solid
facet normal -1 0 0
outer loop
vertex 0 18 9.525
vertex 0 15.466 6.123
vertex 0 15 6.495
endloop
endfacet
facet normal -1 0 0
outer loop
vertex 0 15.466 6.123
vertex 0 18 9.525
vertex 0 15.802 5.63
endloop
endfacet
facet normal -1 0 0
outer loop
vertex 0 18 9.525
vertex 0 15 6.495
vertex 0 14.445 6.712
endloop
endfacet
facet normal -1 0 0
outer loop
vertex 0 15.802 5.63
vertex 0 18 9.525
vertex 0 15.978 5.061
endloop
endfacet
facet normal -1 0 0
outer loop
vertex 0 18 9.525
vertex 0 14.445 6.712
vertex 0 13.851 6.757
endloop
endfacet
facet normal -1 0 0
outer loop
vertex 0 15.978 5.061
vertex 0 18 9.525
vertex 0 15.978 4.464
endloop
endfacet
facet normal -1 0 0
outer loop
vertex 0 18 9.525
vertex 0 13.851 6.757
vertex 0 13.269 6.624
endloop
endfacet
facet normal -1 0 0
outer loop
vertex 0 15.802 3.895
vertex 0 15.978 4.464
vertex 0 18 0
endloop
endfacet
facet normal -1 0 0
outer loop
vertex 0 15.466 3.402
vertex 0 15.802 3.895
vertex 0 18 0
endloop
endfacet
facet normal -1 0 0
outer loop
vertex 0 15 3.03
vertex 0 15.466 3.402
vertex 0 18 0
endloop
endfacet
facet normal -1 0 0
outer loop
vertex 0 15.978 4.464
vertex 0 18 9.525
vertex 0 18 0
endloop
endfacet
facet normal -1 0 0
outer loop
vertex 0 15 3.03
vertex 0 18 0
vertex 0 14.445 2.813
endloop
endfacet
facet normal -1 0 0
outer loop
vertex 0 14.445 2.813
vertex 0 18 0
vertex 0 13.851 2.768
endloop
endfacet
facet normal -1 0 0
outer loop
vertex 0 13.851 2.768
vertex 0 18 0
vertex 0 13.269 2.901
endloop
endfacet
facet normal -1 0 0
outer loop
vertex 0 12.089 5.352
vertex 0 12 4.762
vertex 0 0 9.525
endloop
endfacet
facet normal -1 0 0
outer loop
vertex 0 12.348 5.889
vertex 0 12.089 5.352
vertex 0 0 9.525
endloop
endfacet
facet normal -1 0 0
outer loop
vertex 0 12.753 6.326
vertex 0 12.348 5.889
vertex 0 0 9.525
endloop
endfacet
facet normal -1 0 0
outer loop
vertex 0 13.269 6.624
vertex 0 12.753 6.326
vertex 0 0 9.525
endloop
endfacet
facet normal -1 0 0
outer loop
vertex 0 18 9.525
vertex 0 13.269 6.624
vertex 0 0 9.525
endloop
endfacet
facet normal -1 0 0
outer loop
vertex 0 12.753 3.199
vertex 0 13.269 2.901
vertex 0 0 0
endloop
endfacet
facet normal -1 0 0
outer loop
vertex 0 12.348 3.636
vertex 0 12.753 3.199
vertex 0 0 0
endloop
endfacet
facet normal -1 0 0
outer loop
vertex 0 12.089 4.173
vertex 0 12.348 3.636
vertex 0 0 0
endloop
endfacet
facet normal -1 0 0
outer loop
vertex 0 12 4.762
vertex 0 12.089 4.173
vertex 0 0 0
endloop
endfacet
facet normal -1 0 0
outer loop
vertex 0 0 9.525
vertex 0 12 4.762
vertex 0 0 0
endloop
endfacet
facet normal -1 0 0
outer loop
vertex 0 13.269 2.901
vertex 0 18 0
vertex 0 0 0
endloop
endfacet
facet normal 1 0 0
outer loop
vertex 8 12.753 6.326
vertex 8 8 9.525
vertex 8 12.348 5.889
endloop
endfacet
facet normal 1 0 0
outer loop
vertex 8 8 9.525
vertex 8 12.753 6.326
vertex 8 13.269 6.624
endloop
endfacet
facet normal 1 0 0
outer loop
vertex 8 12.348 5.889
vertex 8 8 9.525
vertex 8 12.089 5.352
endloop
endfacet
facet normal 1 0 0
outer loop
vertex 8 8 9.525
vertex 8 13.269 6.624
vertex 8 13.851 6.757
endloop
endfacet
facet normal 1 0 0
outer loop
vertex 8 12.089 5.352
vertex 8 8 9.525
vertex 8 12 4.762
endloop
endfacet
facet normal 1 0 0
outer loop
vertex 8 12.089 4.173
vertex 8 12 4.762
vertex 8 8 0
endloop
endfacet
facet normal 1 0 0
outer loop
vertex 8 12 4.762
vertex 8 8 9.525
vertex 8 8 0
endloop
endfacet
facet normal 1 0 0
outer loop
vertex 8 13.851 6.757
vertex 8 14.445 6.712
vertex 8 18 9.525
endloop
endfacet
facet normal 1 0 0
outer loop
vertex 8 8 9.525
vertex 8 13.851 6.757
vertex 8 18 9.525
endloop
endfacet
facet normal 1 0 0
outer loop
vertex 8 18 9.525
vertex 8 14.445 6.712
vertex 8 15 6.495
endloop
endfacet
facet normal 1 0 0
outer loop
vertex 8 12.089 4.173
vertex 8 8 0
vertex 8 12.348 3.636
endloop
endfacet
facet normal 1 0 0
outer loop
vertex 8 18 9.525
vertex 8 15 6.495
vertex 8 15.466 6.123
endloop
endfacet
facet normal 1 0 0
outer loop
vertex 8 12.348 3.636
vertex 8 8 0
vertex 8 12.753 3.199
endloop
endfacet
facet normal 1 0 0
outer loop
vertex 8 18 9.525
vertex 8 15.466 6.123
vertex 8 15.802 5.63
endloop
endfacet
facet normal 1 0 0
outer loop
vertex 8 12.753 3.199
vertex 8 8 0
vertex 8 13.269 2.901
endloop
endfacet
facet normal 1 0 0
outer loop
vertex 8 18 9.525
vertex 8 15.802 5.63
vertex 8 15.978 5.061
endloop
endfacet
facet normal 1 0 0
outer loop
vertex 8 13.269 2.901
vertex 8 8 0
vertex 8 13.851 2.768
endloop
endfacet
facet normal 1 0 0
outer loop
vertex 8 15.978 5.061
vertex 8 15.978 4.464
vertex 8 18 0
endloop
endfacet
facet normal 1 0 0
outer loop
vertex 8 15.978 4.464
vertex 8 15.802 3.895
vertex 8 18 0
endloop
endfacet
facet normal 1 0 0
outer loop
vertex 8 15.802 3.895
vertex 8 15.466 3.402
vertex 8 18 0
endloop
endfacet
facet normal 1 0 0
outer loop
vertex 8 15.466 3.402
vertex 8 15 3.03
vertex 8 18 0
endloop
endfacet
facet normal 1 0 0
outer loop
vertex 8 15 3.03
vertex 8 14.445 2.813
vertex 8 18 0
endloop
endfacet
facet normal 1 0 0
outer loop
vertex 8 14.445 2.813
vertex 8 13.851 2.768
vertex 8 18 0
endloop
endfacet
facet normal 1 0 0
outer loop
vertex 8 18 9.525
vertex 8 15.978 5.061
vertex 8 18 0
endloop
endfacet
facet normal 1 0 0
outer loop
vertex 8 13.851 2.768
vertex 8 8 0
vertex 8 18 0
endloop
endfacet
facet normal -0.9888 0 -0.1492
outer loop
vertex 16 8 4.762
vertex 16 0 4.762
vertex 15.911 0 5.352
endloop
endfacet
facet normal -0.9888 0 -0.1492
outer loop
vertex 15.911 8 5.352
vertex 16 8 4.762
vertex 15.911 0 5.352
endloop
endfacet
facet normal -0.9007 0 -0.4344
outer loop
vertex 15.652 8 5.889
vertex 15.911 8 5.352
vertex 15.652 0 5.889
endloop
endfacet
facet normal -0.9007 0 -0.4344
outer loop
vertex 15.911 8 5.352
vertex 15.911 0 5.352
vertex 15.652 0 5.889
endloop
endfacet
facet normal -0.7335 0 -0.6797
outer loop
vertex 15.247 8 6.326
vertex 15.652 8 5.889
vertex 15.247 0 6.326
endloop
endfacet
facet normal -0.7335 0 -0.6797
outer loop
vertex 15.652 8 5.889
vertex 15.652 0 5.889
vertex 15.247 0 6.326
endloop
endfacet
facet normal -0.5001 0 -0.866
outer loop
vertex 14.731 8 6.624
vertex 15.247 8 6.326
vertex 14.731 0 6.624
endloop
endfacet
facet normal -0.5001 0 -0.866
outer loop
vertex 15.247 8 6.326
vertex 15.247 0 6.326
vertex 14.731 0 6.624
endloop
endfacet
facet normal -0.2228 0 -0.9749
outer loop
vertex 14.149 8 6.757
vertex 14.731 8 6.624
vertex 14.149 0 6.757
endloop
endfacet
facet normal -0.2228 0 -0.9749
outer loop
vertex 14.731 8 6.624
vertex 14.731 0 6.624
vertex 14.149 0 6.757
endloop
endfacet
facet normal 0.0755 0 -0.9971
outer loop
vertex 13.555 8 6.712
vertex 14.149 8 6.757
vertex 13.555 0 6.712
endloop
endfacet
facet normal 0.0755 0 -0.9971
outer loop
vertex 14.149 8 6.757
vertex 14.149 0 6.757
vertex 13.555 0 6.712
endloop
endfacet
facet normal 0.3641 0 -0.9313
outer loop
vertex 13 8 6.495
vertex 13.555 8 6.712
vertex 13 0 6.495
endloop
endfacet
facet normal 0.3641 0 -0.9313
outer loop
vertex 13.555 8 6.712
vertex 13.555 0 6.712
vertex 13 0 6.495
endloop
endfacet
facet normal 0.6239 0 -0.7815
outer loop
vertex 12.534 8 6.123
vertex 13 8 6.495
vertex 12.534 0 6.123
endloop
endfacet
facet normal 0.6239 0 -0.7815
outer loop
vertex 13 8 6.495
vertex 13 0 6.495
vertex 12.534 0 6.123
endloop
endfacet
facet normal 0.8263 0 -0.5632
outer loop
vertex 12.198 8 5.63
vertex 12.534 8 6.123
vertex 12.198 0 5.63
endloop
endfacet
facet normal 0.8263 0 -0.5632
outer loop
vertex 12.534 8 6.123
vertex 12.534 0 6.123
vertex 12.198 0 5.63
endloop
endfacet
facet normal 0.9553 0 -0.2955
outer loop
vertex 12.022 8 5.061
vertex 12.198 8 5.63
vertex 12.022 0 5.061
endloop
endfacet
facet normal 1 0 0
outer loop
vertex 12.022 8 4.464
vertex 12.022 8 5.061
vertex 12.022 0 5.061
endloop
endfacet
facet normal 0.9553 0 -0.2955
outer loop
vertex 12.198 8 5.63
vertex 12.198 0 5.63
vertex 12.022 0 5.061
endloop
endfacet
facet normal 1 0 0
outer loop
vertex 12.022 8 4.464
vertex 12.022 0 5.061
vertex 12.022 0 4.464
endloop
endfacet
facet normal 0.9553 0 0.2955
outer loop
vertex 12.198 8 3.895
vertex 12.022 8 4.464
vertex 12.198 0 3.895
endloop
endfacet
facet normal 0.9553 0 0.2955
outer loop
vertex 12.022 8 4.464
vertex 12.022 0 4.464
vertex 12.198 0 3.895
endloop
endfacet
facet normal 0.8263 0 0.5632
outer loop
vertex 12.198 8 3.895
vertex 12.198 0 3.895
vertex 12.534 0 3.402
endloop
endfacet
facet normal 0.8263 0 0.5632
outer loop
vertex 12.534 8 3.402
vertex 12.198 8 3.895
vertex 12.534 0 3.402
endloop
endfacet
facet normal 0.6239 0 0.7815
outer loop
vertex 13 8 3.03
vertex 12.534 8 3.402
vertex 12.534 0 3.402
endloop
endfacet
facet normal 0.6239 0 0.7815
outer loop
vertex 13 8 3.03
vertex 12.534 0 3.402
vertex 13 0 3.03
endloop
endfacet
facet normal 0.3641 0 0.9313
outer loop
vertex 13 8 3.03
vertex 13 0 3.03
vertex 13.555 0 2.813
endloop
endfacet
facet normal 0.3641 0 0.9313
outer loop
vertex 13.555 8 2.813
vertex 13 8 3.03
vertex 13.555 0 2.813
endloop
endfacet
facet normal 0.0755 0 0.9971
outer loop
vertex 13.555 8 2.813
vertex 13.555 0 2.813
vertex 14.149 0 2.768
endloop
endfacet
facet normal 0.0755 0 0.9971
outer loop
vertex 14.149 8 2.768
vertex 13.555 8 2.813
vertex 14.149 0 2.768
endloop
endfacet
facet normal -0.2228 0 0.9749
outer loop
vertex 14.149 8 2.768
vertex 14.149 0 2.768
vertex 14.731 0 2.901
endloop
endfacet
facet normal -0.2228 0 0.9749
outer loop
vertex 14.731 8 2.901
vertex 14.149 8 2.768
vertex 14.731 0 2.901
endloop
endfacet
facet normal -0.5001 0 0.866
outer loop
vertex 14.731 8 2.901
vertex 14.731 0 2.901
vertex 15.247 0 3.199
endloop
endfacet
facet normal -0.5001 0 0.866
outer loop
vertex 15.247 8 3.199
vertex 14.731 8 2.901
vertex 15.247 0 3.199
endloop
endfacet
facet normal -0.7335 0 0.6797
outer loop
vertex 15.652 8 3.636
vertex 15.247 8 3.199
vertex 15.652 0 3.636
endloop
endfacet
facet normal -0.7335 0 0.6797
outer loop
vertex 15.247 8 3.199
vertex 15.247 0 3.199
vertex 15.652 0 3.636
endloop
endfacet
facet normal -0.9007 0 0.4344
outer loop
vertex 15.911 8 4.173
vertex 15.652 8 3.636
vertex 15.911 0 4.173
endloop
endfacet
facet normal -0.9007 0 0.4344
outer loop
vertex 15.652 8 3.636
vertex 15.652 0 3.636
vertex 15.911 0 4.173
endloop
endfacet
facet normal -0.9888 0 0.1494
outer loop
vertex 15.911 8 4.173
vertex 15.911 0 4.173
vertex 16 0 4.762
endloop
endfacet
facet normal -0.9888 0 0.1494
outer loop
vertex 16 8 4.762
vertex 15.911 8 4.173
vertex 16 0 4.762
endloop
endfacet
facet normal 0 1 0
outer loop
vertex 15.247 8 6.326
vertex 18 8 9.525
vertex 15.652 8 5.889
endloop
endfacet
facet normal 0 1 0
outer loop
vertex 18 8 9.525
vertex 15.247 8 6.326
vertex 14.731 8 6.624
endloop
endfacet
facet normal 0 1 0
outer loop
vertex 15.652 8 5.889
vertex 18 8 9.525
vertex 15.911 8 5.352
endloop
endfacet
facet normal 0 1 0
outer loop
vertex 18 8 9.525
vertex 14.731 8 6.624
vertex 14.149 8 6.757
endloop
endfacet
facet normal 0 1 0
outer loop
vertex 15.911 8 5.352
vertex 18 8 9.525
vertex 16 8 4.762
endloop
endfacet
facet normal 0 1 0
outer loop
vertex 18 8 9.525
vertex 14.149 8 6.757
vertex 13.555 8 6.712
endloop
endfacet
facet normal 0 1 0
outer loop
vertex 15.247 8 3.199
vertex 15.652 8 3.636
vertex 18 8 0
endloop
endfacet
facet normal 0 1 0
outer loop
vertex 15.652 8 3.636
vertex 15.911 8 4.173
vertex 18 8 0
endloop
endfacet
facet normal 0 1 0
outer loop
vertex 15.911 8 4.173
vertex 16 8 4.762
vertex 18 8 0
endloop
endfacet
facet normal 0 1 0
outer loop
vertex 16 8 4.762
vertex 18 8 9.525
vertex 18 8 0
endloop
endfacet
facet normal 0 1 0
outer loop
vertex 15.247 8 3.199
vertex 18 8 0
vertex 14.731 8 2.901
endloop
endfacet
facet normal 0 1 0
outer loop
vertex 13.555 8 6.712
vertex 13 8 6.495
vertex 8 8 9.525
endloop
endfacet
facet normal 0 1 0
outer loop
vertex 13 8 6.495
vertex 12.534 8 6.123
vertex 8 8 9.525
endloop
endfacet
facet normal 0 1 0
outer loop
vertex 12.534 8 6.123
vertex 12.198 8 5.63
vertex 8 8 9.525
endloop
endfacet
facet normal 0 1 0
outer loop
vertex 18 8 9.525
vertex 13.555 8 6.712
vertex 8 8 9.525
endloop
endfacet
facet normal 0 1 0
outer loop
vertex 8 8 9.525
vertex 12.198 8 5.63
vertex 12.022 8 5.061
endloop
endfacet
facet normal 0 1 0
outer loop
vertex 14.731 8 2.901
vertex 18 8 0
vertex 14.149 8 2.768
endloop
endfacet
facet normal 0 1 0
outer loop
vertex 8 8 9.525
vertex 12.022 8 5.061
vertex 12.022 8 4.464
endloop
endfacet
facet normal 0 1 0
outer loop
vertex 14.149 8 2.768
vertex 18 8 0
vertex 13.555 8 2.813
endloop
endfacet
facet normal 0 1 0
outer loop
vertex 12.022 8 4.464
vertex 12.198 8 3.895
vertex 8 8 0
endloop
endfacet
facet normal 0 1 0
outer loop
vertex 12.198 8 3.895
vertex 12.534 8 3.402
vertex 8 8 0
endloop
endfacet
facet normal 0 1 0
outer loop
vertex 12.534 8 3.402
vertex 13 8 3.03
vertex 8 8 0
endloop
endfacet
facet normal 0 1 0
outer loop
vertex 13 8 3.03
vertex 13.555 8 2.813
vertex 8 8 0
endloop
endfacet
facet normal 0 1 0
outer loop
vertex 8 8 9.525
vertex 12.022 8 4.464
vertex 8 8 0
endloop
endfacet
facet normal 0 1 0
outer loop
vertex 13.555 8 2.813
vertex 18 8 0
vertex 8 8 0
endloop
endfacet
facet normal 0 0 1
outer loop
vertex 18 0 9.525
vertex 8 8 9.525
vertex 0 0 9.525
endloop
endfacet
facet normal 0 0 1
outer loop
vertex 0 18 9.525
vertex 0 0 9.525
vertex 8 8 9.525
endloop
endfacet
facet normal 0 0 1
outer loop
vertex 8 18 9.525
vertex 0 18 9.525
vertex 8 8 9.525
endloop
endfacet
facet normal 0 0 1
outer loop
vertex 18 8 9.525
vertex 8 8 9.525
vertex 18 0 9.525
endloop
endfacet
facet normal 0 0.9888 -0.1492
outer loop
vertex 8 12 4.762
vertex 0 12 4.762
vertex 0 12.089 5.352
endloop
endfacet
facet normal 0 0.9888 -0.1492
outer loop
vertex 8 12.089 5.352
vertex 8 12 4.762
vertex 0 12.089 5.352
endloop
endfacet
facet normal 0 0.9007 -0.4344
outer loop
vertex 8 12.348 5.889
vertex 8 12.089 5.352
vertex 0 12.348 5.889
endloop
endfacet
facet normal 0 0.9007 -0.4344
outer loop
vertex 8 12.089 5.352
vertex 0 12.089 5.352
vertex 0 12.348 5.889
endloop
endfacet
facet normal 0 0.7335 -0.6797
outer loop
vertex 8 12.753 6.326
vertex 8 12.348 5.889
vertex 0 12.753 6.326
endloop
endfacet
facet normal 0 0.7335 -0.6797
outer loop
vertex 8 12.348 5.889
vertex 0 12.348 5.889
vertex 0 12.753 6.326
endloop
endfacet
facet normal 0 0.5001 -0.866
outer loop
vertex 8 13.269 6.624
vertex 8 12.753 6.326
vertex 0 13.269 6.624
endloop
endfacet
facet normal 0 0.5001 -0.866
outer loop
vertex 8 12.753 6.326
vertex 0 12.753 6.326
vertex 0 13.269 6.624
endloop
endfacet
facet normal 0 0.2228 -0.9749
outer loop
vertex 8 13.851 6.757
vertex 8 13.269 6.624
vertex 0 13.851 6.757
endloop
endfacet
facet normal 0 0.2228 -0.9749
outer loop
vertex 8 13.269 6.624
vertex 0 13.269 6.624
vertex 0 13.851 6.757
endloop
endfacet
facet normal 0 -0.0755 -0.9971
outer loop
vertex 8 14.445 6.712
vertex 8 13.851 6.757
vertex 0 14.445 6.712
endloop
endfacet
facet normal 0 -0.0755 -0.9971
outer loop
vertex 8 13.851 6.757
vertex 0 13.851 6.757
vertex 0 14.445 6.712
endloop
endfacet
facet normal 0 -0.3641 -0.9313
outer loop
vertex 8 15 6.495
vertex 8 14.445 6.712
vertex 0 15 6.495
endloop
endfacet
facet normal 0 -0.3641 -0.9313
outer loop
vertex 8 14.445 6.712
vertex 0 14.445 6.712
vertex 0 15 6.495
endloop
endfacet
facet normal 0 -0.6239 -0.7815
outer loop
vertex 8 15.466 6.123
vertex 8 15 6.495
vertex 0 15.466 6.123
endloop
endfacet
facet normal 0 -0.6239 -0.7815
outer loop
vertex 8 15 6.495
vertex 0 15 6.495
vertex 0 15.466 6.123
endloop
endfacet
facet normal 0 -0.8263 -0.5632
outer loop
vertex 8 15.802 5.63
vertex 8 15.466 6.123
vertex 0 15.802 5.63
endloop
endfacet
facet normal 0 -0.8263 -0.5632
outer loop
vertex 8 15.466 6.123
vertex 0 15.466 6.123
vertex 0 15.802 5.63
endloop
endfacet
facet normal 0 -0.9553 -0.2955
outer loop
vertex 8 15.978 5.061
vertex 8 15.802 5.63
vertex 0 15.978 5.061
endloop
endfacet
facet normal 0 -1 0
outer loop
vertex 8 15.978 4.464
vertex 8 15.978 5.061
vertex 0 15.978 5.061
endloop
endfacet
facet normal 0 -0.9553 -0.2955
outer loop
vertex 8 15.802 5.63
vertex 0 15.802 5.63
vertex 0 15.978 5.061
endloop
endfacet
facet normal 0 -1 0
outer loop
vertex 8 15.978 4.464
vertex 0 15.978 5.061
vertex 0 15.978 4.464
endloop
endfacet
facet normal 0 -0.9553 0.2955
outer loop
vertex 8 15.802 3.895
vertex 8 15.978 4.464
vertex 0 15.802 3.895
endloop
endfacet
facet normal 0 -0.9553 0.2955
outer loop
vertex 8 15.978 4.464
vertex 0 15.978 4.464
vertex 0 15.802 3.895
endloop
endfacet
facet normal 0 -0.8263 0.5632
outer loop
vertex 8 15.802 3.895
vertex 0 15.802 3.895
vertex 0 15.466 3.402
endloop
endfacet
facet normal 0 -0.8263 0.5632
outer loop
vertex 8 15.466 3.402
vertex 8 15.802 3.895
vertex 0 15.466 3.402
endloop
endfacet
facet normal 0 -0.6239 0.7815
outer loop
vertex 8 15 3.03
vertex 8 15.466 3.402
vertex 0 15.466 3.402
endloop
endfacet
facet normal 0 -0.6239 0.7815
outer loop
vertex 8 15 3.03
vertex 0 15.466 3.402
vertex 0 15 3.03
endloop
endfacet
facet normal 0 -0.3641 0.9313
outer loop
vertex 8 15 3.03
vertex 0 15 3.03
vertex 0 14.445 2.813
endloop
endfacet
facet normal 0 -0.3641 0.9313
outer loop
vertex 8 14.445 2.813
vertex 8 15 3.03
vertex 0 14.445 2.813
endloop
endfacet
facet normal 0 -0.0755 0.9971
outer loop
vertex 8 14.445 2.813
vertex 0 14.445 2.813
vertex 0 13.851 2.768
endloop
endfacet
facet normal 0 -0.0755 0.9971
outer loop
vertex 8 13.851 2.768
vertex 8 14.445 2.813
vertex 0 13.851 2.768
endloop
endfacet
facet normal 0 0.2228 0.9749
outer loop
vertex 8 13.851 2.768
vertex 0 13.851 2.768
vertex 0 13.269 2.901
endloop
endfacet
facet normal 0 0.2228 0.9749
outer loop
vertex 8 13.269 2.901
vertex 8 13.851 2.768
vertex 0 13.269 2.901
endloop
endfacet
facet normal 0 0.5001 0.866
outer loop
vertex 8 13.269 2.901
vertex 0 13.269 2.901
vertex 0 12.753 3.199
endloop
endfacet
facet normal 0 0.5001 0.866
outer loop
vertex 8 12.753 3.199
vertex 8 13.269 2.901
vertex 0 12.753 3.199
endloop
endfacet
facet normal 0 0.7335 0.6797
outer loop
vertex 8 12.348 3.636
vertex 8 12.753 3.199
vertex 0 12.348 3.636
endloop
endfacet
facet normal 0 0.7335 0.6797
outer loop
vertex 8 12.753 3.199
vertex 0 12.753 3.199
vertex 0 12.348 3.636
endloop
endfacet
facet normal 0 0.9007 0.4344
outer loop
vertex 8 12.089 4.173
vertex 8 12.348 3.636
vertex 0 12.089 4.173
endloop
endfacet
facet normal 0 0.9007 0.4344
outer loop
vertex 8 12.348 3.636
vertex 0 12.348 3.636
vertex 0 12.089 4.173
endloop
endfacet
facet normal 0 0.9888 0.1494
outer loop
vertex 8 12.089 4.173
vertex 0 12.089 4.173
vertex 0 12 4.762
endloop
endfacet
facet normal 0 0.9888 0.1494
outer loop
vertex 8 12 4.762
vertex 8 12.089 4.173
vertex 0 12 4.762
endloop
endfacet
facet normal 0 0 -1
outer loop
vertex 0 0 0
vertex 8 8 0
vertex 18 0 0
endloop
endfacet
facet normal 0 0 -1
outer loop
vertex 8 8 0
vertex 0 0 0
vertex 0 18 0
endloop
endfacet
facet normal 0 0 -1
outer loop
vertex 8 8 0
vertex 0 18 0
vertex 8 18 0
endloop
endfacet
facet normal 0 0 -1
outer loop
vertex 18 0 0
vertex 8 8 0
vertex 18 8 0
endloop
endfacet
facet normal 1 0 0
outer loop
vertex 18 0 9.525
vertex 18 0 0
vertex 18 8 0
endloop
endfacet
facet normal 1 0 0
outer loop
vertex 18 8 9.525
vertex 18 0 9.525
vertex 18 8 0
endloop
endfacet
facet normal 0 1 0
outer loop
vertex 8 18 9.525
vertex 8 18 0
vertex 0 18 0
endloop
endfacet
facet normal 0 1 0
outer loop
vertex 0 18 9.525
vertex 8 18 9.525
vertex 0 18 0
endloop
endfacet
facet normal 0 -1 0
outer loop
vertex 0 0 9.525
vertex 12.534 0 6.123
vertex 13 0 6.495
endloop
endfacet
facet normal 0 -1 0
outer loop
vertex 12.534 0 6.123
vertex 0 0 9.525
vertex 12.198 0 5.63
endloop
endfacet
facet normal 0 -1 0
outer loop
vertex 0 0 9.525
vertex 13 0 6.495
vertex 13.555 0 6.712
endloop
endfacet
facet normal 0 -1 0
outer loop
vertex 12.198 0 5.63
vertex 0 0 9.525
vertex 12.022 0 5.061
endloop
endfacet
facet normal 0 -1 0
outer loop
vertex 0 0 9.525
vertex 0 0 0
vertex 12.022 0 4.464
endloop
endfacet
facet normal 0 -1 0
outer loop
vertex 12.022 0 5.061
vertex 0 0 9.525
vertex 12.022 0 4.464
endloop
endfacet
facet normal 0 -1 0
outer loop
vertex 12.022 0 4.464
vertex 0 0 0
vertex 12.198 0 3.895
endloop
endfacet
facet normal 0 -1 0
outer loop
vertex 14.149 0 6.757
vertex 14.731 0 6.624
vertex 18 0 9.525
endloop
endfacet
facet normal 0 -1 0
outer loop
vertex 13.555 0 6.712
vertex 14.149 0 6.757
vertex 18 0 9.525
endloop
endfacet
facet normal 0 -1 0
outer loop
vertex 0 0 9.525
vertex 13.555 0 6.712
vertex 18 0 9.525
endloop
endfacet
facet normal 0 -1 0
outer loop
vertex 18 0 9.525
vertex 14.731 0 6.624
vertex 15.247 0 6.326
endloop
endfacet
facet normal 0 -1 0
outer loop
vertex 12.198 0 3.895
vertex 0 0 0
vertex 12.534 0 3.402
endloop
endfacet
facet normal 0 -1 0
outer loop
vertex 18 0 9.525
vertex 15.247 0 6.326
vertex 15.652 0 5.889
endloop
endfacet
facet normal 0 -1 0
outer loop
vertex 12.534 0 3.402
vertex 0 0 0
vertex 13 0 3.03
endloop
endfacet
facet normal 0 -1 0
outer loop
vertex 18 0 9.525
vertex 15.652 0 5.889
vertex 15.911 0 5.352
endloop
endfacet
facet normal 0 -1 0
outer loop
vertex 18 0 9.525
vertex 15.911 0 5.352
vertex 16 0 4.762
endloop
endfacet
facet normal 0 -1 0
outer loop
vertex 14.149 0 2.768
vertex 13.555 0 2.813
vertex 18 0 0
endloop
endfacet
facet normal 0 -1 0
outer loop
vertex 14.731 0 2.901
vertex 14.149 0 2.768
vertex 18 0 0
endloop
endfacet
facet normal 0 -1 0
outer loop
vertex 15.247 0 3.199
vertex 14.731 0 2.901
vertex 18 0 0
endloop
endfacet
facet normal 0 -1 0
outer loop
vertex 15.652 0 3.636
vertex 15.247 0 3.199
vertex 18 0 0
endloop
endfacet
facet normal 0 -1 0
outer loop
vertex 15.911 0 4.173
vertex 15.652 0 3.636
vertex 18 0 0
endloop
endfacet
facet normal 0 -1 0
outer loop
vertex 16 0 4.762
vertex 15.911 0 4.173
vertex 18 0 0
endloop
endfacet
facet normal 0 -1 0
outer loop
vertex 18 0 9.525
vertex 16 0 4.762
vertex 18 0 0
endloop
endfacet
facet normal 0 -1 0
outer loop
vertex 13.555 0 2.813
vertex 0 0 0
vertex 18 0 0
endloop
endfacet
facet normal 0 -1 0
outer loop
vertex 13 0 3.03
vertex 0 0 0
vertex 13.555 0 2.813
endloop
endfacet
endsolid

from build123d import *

# Parameters (mm, degrees)
EXTRUDE_3_8_DEPTH = 9.525
SKETCH2_R         = 2
M4_DRILL_DEPTH    = 8
SKETCH3_R         = 2
M4_DRILL2_DEPTH   = 8


with BuildPart() as part:
    # Sketch1 → 3/8 (new body)
    with BuildSketch(Plane.XY):
        Polygon((0, 0), (18, 0), (18, 8), (8, 8), (8, 18), (0, 18), align=None)
    extrude(amount=EXTRUDE_3_8_DEPTH)

    # Sketch2 → M4_DRILL (cut)
    with BuildSketch(Plane.ZY):
        with Locations(Location((4.7625, 14, 0), (0, 0, 270))):
            Circle(SKETCH2_R)
    extrude(amount=-M4_DRILL_DEPTH, mode=Mode.SUBTRACT)

    # Sketch3 → M4_DRILL2 (cut)
    with BuildSketch(Plane(origin=(0, 0, 0), x_dir=(-1, 0, 0), z_dir=(0, -1, 0))):
        with Locations(Location((-14, -4.7625, 0), (0, 0, 180))):
            Circle(SKETCH3_R)
    extrude(amount=-M4_DRILL2_DEPTH, mode=Mode.SUBTRACT)


solid = part.part
